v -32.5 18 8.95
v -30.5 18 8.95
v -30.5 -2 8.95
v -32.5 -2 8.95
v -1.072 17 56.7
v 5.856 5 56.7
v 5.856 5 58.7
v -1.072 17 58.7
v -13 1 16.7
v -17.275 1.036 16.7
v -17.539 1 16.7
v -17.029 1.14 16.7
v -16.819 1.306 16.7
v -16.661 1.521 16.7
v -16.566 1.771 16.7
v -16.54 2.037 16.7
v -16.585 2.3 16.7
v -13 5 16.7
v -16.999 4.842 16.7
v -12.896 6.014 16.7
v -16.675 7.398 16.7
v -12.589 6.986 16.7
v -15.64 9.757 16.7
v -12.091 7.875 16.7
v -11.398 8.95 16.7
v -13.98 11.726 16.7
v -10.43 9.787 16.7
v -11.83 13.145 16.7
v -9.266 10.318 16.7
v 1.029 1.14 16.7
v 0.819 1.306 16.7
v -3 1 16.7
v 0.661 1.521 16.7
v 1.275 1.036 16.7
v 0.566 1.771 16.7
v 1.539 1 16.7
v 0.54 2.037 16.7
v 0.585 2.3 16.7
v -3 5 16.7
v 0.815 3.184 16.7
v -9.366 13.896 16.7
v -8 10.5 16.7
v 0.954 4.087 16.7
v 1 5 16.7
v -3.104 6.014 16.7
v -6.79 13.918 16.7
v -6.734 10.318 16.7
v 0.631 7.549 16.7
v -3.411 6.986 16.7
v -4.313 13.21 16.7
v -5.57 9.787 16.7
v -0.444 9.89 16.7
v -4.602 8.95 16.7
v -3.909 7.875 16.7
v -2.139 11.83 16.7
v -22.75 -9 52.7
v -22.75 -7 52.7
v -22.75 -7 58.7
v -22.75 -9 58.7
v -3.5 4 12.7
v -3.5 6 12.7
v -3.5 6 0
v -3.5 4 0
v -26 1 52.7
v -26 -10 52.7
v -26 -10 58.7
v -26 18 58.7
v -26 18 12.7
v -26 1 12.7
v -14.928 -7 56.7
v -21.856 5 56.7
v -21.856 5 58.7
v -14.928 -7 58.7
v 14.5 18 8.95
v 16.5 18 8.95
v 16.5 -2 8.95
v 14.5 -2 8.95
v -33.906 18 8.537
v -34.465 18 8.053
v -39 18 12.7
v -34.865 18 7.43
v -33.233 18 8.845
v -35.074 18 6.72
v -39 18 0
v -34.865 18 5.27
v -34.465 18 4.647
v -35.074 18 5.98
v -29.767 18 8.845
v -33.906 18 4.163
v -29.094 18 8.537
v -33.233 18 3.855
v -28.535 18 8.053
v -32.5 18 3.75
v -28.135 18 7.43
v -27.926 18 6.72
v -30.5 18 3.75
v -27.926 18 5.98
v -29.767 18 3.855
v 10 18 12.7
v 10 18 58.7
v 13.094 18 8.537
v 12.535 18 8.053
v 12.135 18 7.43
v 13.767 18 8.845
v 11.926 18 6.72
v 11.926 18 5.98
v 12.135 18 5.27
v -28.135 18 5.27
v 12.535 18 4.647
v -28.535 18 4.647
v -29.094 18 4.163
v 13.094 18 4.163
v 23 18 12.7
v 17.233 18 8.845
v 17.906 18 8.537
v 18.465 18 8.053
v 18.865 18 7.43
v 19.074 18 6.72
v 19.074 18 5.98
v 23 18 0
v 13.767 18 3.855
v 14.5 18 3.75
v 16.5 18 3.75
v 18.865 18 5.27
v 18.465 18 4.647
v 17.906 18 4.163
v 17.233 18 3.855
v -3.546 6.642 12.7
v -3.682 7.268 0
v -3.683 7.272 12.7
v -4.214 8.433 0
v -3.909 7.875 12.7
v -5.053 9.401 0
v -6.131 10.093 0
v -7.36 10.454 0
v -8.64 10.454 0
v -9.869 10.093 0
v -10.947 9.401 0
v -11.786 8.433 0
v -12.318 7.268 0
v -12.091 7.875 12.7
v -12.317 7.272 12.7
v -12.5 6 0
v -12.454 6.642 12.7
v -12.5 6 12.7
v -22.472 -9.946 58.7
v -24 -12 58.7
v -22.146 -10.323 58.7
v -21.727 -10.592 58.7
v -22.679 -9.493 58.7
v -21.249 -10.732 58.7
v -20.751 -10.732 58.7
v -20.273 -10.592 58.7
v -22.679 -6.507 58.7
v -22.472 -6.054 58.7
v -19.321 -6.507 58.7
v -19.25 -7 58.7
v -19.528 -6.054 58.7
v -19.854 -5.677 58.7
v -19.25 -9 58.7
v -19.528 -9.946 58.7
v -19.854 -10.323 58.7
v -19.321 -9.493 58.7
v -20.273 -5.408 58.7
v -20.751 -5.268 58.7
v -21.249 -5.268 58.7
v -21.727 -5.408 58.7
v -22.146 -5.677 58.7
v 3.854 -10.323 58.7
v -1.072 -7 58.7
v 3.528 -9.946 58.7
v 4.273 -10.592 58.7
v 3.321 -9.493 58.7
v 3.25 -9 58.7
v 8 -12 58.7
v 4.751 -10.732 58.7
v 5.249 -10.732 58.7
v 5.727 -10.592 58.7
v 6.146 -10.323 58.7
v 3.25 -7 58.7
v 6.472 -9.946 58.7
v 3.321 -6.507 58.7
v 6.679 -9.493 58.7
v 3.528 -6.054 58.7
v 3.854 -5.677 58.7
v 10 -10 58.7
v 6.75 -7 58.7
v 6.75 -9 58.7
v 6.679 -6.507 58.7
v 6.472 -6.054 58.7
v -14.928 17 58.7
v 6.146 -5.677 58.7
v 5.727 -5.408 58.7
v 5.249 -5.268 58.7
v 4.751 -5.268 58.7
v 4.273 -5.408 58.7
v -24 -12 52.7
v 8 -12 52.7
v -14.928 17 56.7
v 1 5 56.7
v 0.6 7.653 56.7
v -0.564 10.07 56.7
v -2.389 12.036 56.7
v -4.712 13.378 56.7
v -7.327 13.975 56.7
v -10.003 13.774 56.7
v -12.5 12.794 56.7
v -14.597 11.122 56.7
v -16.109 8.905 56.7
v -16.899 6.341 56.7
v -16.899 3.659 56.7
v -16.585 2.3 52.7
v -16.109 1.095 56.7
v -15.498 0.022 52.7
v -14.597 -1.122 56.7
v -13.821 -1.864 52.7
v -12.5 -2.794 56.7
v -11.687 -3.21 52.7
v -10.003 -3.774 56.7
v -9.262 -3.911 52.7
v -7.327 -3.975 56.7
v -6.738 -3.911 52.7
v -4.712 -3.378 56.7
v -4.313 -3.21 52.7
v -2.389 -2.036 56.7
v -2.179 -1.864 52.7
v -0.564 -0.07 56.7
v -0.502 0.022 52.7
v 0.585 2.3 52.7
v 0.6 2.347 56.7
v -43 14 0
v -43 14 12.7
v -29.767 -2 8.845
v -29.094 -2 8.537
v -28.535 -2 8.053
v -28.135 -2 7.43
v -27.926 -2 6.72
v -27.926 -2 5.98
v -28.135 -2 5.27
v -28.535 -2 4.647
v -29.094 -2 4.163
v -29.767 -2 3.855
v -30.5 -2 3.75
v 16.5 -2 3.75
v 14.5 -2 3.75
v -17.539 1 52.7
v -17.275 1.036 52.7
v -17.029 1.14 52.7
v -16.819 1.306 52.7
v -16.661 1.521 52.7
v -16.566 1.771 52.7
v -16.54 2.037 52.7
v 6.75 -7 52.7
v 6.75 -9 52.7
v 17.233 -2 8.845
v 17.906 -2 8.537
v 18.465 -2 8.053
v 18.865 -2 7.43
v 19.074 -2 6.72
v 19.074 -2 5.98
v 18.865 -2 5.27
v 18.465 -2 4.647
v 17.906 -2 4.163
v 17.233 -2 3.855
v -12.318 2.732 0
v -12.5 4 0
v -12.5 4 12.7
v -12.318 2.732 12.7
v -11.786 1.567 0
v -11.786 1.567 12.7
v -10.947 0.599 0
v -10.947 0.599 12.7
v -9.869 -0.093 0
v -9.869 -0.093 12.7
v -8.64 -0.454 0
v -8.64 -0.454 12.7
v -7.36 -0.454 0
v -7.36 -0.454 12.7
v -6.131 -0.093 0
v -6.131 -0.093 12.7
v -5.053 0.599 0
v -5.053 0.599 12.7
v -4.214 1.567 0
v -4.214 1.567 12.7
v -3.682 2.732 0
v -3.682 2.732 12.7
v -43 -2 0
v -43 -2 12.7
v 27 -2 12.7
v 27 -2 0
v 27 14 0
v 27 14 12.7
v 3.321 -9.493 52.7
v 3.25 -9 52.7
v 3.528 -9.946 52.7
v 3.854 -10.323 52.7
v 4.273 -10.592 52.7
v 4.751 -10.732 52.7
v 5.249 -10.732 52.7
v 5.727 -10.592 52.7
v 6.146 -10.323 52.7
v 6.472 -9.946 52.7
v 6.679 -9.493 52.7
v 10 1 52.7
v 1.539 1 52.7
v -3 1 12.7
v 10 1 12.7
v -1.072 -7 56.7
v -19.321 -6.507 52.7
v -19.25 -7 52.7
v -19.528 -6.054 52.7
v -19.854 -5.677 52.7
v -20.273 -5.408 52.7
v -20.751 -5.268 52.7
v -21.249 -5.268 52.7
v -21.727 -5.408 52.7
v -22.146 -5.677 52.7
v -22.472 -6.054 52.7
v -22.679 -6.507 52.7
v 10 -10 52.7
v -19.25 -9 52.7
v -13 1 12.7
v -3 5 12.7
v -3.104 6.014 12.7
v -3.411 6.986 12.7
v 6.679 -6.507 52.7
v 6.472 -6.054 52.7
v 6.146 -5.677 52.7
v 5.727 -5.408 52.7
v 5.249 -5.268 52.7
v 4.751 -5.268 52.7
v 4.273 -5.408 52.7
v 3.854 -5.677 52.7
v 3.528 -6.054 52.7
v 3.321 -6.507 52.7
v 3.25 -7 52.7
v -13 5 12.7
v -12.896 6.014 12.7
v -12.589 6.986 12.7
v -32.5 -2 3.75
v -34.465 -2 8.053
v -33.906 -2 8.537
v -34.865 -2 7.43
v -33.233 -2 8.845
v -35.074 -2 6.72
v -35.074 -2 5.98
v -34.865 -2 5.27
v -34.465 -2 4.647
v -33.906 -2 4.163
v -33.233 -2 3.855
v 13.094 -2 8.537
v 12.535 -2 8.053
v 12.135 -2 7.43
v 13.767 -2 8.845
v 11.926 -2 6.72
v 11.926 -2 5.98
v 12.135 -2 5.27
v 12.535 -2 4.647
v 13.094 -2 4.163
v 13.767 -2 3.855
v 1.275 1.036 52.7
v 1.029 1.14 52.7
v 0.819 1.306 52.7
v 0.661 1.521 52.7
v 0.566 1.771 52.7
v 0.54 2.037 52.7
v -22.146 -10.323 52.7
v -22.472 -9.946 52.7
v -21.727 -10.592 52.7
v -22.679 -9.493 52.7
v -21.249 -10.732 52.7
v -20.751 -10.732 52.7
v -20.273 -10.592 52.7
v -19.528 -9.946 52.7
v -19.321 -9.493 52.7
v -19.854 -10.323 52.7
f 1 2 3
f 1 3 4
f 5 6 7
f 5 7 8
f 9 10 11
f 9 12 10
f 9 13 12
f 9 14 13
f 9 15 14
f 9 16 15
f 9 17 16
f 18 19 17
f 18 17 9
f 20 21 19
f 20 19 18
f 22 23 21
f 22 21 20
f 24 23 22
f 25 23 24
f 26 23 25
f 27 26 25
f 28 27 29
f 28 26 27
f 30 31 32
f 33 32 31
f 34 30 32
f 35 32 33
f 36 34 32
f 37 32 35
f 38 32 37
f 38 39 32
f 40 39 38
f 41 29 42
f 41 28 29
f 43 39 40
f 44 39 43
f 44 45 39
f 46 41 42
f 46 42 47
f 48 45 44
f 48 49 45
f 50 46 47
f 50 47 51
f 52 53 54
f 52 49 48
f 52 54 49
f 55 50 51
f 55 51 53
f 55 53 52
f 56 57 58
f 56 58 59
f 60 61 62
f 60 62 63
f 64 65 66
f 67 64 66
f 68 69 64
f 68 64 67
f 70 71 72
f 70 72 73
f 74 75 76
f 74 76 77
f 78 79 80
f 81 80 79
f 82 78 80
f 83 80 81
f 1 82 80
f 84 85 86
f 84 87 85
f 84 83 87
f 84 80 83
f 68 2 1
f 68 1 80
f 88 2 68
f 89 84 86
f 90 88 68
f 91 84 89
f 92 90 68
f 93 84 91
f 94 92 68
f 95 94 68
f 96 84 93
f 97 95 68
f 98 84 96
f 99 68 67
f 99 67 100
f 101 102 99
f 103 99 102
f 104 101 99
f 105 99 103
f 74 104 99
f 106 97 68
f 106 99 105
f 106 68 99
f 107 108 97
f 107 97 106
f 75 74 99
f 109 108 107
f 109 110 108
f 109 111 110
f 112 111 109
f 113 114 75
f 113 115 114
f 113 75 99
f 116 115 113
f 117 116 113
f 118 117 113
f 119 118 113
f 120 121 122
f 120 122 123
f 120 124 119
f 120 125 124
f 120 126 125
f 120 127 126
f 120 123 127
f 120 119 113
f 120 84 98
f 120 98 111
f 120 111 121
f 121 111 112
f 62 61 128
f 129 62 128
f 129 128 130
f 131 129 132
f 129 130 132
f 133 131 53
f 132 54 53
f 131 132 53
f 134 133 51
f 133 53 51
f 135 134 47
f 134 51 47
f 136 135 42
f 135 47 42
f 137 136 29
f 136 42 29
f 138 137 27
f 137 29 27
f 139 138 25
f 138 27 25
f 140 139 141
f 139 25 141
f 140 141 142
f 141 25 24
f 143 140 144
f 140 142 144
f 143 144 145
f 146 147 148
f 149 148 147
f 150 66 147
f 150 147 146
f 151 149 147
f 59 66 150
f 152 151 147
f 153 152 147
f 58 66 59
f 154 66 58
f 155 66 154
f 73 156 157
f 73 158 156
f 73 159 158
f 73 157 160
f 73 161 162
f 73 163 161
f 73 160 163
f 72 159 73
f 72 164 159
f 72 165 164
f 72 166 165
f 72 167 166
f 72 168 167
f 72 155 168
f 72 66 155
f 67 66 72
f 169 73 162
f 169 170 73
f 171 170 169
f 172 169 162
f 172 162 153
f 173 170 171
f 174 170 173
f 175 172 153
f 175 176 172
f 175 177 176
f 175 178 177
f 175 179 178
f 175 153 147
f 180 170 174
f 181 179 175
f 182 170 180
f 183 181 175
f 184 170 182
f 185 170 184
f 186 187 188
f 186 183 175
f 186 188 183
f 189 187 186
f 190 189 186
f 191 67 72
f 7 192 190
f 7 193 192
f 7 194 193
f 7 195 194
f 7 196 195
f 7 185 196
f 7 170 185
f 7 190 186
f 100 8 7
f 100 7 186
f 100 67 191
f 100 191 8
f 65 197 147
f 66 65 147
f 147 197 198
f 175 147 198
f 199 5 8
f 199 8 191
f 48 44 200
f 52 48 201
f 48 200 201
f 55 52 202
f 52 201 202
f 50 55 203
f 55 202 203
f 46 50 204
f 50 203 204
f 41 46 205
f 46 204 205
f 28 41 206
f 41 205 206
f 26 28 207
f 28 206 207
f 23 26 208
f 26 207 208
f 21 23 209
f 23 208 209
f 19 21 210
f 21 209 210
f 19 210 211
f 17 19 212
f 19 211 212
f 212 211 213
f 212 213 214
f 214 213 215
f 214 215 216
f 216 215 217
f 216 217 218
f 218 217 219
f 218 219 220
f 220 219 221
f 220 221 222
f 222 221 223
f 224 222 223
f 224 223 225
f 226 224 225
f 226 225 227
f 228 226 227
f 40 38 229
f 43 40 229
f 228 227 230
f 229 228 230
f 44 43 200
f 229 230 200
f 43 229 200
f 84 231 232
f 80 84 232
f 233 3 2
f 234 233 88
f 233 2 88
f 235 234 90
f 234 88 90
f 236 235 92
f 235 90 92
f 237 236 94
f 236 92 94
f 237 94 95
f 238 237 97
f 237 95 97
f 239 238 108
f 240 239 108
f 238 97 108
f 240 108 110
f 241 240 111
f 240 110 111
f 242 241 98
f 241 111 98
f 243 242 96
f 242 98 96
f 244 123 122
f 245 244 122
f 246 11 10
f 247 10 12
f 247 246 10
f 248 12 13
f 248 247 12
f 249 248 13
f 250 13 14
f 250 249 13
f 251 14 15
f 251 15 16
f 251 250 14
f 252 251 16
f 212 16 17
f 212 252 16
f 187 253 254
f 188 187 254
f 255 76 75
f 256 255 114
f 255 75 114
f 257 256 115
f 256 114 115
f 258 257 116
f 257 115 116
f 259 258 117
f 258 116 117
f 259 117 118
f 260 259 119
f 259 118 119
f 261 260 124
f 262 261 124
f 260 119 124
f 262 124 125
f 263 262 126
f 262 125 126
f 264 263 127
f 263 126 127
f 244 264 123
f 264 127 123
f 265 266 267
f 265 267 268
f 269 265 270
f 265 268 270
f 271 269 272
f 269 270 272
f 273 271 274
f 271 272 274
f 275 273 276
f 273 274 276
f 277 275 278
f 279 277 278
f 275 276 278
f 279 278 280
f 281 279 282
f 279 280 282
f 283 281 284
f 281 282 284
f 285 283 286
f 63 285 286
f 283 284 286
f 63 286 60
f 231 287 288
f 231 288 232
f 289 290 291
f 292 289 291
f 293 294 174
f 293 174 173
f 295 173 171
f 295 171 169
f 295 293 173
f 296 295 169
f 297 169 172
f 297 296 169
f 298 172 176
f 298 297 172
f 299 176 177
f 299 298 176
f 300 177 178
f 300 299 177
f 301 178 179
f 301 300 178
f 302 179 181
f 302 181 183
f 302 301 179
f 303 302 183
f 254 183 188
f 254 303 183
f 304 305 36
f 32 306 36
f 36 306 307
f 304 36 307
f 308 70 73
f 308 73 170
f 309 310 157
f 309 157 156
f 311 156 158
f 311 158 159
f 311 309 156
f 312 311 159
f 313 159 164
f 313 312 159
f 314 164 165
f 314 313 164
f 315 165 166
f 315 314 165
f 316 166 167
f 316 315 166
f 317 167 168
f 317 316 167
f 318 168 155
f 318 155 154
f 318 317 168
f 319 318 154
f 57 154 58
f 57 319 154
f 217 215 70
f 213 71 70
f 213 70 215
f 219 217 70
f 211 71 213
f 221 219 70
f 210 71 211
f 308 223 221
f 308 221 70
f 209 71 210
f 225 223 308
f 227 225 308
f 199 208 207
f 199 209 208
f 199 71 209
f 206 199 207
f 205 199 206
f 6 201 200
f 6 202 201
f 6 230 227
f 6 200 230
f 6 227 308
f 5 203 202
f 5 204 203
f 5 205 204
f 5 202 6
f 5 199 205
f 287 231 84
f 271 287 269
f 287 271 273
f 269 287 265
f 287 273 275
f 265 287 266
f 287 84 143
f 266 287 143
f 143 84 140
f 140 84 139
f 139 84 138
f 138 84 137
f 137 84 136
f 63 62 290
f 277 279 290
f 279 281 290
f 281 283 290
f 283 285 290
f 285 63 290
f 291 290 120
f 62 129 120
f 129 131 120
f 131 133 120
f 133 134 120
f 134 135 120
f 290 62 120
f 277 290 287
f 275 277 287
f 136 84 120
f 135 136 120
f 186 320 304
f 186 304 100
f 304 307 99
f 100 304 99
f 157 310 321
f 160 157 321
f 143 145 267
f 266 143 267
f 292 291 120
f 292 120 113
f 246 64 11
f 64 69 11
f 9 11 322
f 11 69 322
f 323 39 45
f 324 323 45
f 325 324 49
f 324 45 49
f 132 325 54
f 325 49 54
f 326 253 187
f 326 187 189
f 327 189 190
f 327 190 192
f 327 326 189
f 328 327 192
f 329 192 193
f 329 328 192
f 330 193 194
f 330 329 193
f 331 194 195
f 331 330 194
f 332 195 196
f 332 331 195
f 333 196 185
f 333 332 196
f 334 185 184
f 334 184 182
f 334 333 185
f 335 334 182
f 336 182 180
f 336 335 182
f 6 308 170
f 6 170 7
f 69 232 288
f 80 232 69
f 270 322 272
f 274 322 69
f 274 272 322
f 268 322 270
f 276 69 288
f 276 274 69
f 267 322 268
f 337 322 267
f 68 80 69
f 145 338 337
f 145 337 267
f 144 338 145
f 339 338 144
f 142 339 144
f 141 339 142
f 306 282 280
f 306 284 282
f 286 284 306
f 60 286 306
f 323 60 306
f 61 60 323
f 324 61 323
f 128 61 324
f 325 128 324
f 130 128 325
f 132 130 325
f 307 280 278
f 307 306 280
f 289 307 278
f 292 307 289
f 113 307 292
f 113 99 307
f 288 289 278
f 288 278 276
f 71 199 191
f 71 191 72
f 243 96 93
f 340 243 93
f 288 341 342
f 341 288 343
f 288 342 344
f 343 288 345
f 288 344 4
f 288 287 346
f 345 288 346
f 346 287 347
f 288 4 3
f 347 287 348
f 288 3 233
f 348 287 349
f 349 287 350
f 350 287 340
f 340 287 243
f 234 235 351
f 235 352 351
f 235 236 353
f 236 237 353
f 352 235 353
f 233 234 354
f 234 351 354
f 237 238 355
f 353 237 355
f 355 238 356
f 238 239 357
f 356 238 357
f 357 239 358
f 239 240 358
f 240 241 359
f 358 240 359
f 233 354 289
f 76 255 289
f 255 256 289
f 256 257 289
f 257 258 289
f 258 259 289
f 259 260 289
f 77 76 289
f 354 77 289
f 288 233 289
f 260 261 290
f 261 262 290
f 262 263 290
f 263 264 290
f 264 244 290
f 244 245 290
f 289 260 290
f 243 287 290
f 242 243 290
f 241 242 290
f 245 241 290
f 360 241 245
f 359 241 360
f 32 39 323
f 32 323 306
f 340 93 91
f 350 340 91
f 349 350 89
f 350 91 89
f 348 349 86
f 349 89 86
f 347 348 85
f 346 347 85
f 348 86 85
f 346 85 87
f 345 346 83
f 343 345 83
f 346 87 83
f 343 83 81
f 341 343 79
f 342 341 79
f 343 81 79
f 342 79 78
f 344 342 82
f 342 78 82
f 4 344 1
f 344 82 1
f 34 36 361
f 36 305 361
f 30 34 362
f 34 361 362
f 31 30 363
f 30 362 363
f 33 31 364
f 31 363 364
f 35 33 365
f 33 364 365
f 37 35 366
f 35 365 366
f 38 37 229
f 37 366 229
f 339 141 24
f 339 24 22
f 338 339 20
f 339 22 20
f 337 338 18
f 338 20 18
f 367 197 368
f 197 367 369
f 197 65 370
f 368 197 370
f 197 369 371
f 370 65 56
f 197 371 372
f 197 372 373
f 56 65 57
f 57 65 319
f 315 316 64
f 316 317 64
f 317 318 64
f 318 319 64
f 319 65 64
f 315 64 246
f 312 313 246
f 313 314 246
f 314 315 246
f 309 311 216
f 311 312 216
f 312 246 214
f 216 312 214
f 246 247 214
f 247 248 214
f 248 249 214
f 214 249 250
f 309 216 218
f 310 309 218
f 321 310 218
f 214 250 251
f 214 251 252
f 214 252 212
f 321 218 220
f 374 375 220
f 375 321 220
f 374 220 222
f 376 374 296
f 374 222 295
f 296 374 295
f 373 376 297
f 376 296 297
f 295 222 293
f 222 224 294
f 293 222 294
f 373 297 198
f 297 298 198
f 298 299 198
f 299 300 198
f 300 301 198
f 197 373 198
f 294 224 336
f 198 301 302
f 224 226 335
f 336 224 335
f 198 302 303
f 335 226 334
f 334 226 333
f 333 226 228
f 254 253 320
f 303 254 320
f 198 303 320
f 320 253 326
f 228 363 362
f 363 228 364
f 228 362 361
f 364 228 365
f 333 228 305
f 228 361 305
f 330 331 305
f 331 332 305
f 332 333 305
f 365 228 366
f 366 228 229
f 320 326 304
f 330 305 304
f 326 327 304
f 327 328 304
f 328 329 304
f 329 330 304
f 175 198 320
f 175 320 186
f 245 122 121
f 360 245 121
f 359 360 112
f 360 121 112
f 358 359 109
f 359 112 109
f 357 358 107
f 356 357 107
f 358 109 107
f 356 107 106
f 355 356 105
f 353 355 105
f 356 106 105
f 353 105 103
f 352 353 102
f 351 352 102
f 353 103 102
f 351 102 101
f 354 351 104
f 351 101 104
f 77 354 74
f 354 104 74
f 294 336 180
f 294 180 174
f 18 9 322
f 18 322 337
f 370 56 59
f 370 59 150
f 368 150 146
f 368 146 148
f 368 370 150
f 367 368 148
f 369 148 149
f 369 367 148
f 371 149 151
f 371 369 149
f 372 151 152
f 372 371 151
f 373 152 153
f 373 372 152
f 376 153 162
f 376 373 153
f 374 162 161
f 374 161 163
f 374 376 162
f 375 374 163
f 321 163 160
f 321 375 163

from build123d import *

# Parameters (mm, degrees)
SKETCH001_W          = 70
SKETCH001_H          = 20
PAD_DEPTH            = 12.7
SKETCH012_W          = 36
SKETCH012_H          = 17
PAD001_DEPTH         = 40
POCKET_DEPTH         = 40
POCKET001_DEPTH      = 22.994766
SKETCH007_W          = 36
SKETCH007_H          = 30
PAD002_DEPTH         = 6
POCKET002_DEPTH      = 2
POCKET003_DEPTH      = 22
POCKET003_DEPTH_BACK = -100
SKETCH013_R          = 9
POCKET004_DEPTH      = 40
FILLET_R             = 1
CHAMFER_SIZE         = 2
CHAMFER001_SIZE      = 4


with BuildPart() as part:
    # Sketch001 → Pad (new body)
    with BuildSketch(Plane.XY):
        with Locations((-8, 8)):
            Rectangle(SKETCH001_W, SKETCH001_H)
    extrude(amount=PAD_DEPTH)

    # Sketch012 (on Face6 of Pad) → Pad001 (join)
    with BuildSketch(Plane.XY.offset(12.7)):
        with Locations((-8, 9.5)):
            Rectangle(SKETCH012_W, SKETCH012_H)
    extrude(amount=PAD001_DEPTH)

    # Sketch005 → Pocket (cut)
    with BuildSketch(Plane.XY.offset(52.7)):
        with BuildLine():
            ThreePointArc((-3, 5), (-8, 10), (-13, 5))
            Line((-13, -7.39), (-13, 5))
            Line((-3, -7.39), (-13, -7.39))
            Line((-3, 5), (-3, -7.39))
        make_face()
    extrude(amount=-POCKET_DEPTH, mode=Mode.SUBTRACT)

    # Sketch010 → Pocket001 (cut, through all)
    with BuildSketch(Plane(origin=(0, 20.993766, 0), x_dir=(-1, 0, 0), z_dir=(0, 1, 0))):
        with BuildLine():
            ThreePointArc((-16.5, 8.95), (-19.1, 6.35), (-16.5, 3.75))
            Line((-16.5, 3.75), (-14.5, 3.75))
            ThreePointArc((-14.5, 3.75), (-11.9, 6.35), (-14.5, 8.95))
            Line((-16.5, 8.95), (-14.5, 8.95))
        make_face()
        with BuildLine():
            ThreePointArc((30.5, 8.95), (27.9, 6.35), (30.5, 3.75))
            Line((30.5, 3.75), (32.5, 3.75))
            ThreePointArc((32.5, 3.75), (35.1, 6.35), (32.5, 8.95))
            Line((30.5, 8.95), (32.5, 8.95))
        make_face()
    extrude(amount=-POCKET001_DEPTH, mode=Mode.SUBTRACT)

    # Sketch007 → Pad002 (join)
    with BuildSketch(Plane.XY.offset(52.7)):
        with Locations((-8, 3)):
            Rectangle(SKETCH007_W, SKETCH007_H)
        with BuildLine():
            ThreePointArc((-19.25, -7), (-21, -5.25), (-22.75, -7))
            Line((-22.75, -7), (-22.75, -9))
            ThreePointArc((-22.75, -9), (-21, -10.75), (-19.25, -9))
            Line((-19.25, -7), (-19.25, -9))
        make_face(mode=Mode.SUBTRACT)
        with BuildLine():
            ThreePointArc((6.75, -7), (5, -5.25), (3.25, -7))
            Line((3.25, -7), (3.25, -9))
            ThreePointArc((3.25, -9), (5, -10.75), (6.75, -9))
            Line((6.75, -7), (6.75, -9))
        make_face(mode=Mode.SUBTRACT)
    extrude(amount=PAD002_DEPTH)

    # Sketch008 → Pocket002 (cut)
    with BuildSketch(Plane.XY.offset(56.7)):
        Polygon((5.856406, 5), (-1.071797, 17), (-14.928203, 17), (-21.856406, 5), (-14.928203, -7), (-1.071797, -7), align=None)
    extrude(amount=POCKET002_DEPTH, mode=Mode.SUBTRACT)

    # Sketch006 → Pocket003 (cut, two sides)
    with BuildSketch(Plane.XY.offset(12.7)) as pocket003_sk:
        with BuildLine():
            ThreePointArc((-3.5, 6), (-8, 10.5), (-12.5, 6))
            Line((-12.5, 6), (-12.5, 4))
            ThreePointArc((-12.5, 4), (-8, -0.5), (-3.5, 4))
            Line((-3.5, 6), (-3.5, 4))
        make_face()
    extrude(amount=-POCKET003_DEPTH, mode=Mode.SUBTRACT)
    extrude(pocket003_sk.sketch, amount=-POCKET003_DEPTH_BACK, mode=Mode.SUBTRACT)

    # Sketch013 (on Face29 of Pocket003) → Pocket004 (cut)
    with BuildSketch(Plane.XY.offset(56.7)):
        with Locations((-8, 5)):
            Circle(SKETCH013_R)
    extrude(amount=-POCKET004_DEPTH, mode=Mode.SUBTRACT)

    # Fillet
    fillet_edges = [part.edges().sort_by_distance(p)[0] for p in [
        (0.062258, 1, 34.7),
        (-16.062258, 1, 34.7),
    ]]
    fillet(fillet_edges, radius=FILLET_R)

    # Chamfer
    chamfer_edges = [part.edges().sort_by_distance(p)[0] for p in [
        (10, -12, 55.7),
        (-26, -12, 55.7),
    ]]
    chamfer(chamfer_edges, length=CHAMFER_SIZE)

    # Chamfer001
    chamfer001_edges = [part.edges().sort_by_distance(p)[0] for p in [
        (-43, 18, 6.35),
        (27, 18, 6.35),
    ]]
    chamfer(chamfer001_edges, length=CHAMFER001_SIZE)


solid = part.part
